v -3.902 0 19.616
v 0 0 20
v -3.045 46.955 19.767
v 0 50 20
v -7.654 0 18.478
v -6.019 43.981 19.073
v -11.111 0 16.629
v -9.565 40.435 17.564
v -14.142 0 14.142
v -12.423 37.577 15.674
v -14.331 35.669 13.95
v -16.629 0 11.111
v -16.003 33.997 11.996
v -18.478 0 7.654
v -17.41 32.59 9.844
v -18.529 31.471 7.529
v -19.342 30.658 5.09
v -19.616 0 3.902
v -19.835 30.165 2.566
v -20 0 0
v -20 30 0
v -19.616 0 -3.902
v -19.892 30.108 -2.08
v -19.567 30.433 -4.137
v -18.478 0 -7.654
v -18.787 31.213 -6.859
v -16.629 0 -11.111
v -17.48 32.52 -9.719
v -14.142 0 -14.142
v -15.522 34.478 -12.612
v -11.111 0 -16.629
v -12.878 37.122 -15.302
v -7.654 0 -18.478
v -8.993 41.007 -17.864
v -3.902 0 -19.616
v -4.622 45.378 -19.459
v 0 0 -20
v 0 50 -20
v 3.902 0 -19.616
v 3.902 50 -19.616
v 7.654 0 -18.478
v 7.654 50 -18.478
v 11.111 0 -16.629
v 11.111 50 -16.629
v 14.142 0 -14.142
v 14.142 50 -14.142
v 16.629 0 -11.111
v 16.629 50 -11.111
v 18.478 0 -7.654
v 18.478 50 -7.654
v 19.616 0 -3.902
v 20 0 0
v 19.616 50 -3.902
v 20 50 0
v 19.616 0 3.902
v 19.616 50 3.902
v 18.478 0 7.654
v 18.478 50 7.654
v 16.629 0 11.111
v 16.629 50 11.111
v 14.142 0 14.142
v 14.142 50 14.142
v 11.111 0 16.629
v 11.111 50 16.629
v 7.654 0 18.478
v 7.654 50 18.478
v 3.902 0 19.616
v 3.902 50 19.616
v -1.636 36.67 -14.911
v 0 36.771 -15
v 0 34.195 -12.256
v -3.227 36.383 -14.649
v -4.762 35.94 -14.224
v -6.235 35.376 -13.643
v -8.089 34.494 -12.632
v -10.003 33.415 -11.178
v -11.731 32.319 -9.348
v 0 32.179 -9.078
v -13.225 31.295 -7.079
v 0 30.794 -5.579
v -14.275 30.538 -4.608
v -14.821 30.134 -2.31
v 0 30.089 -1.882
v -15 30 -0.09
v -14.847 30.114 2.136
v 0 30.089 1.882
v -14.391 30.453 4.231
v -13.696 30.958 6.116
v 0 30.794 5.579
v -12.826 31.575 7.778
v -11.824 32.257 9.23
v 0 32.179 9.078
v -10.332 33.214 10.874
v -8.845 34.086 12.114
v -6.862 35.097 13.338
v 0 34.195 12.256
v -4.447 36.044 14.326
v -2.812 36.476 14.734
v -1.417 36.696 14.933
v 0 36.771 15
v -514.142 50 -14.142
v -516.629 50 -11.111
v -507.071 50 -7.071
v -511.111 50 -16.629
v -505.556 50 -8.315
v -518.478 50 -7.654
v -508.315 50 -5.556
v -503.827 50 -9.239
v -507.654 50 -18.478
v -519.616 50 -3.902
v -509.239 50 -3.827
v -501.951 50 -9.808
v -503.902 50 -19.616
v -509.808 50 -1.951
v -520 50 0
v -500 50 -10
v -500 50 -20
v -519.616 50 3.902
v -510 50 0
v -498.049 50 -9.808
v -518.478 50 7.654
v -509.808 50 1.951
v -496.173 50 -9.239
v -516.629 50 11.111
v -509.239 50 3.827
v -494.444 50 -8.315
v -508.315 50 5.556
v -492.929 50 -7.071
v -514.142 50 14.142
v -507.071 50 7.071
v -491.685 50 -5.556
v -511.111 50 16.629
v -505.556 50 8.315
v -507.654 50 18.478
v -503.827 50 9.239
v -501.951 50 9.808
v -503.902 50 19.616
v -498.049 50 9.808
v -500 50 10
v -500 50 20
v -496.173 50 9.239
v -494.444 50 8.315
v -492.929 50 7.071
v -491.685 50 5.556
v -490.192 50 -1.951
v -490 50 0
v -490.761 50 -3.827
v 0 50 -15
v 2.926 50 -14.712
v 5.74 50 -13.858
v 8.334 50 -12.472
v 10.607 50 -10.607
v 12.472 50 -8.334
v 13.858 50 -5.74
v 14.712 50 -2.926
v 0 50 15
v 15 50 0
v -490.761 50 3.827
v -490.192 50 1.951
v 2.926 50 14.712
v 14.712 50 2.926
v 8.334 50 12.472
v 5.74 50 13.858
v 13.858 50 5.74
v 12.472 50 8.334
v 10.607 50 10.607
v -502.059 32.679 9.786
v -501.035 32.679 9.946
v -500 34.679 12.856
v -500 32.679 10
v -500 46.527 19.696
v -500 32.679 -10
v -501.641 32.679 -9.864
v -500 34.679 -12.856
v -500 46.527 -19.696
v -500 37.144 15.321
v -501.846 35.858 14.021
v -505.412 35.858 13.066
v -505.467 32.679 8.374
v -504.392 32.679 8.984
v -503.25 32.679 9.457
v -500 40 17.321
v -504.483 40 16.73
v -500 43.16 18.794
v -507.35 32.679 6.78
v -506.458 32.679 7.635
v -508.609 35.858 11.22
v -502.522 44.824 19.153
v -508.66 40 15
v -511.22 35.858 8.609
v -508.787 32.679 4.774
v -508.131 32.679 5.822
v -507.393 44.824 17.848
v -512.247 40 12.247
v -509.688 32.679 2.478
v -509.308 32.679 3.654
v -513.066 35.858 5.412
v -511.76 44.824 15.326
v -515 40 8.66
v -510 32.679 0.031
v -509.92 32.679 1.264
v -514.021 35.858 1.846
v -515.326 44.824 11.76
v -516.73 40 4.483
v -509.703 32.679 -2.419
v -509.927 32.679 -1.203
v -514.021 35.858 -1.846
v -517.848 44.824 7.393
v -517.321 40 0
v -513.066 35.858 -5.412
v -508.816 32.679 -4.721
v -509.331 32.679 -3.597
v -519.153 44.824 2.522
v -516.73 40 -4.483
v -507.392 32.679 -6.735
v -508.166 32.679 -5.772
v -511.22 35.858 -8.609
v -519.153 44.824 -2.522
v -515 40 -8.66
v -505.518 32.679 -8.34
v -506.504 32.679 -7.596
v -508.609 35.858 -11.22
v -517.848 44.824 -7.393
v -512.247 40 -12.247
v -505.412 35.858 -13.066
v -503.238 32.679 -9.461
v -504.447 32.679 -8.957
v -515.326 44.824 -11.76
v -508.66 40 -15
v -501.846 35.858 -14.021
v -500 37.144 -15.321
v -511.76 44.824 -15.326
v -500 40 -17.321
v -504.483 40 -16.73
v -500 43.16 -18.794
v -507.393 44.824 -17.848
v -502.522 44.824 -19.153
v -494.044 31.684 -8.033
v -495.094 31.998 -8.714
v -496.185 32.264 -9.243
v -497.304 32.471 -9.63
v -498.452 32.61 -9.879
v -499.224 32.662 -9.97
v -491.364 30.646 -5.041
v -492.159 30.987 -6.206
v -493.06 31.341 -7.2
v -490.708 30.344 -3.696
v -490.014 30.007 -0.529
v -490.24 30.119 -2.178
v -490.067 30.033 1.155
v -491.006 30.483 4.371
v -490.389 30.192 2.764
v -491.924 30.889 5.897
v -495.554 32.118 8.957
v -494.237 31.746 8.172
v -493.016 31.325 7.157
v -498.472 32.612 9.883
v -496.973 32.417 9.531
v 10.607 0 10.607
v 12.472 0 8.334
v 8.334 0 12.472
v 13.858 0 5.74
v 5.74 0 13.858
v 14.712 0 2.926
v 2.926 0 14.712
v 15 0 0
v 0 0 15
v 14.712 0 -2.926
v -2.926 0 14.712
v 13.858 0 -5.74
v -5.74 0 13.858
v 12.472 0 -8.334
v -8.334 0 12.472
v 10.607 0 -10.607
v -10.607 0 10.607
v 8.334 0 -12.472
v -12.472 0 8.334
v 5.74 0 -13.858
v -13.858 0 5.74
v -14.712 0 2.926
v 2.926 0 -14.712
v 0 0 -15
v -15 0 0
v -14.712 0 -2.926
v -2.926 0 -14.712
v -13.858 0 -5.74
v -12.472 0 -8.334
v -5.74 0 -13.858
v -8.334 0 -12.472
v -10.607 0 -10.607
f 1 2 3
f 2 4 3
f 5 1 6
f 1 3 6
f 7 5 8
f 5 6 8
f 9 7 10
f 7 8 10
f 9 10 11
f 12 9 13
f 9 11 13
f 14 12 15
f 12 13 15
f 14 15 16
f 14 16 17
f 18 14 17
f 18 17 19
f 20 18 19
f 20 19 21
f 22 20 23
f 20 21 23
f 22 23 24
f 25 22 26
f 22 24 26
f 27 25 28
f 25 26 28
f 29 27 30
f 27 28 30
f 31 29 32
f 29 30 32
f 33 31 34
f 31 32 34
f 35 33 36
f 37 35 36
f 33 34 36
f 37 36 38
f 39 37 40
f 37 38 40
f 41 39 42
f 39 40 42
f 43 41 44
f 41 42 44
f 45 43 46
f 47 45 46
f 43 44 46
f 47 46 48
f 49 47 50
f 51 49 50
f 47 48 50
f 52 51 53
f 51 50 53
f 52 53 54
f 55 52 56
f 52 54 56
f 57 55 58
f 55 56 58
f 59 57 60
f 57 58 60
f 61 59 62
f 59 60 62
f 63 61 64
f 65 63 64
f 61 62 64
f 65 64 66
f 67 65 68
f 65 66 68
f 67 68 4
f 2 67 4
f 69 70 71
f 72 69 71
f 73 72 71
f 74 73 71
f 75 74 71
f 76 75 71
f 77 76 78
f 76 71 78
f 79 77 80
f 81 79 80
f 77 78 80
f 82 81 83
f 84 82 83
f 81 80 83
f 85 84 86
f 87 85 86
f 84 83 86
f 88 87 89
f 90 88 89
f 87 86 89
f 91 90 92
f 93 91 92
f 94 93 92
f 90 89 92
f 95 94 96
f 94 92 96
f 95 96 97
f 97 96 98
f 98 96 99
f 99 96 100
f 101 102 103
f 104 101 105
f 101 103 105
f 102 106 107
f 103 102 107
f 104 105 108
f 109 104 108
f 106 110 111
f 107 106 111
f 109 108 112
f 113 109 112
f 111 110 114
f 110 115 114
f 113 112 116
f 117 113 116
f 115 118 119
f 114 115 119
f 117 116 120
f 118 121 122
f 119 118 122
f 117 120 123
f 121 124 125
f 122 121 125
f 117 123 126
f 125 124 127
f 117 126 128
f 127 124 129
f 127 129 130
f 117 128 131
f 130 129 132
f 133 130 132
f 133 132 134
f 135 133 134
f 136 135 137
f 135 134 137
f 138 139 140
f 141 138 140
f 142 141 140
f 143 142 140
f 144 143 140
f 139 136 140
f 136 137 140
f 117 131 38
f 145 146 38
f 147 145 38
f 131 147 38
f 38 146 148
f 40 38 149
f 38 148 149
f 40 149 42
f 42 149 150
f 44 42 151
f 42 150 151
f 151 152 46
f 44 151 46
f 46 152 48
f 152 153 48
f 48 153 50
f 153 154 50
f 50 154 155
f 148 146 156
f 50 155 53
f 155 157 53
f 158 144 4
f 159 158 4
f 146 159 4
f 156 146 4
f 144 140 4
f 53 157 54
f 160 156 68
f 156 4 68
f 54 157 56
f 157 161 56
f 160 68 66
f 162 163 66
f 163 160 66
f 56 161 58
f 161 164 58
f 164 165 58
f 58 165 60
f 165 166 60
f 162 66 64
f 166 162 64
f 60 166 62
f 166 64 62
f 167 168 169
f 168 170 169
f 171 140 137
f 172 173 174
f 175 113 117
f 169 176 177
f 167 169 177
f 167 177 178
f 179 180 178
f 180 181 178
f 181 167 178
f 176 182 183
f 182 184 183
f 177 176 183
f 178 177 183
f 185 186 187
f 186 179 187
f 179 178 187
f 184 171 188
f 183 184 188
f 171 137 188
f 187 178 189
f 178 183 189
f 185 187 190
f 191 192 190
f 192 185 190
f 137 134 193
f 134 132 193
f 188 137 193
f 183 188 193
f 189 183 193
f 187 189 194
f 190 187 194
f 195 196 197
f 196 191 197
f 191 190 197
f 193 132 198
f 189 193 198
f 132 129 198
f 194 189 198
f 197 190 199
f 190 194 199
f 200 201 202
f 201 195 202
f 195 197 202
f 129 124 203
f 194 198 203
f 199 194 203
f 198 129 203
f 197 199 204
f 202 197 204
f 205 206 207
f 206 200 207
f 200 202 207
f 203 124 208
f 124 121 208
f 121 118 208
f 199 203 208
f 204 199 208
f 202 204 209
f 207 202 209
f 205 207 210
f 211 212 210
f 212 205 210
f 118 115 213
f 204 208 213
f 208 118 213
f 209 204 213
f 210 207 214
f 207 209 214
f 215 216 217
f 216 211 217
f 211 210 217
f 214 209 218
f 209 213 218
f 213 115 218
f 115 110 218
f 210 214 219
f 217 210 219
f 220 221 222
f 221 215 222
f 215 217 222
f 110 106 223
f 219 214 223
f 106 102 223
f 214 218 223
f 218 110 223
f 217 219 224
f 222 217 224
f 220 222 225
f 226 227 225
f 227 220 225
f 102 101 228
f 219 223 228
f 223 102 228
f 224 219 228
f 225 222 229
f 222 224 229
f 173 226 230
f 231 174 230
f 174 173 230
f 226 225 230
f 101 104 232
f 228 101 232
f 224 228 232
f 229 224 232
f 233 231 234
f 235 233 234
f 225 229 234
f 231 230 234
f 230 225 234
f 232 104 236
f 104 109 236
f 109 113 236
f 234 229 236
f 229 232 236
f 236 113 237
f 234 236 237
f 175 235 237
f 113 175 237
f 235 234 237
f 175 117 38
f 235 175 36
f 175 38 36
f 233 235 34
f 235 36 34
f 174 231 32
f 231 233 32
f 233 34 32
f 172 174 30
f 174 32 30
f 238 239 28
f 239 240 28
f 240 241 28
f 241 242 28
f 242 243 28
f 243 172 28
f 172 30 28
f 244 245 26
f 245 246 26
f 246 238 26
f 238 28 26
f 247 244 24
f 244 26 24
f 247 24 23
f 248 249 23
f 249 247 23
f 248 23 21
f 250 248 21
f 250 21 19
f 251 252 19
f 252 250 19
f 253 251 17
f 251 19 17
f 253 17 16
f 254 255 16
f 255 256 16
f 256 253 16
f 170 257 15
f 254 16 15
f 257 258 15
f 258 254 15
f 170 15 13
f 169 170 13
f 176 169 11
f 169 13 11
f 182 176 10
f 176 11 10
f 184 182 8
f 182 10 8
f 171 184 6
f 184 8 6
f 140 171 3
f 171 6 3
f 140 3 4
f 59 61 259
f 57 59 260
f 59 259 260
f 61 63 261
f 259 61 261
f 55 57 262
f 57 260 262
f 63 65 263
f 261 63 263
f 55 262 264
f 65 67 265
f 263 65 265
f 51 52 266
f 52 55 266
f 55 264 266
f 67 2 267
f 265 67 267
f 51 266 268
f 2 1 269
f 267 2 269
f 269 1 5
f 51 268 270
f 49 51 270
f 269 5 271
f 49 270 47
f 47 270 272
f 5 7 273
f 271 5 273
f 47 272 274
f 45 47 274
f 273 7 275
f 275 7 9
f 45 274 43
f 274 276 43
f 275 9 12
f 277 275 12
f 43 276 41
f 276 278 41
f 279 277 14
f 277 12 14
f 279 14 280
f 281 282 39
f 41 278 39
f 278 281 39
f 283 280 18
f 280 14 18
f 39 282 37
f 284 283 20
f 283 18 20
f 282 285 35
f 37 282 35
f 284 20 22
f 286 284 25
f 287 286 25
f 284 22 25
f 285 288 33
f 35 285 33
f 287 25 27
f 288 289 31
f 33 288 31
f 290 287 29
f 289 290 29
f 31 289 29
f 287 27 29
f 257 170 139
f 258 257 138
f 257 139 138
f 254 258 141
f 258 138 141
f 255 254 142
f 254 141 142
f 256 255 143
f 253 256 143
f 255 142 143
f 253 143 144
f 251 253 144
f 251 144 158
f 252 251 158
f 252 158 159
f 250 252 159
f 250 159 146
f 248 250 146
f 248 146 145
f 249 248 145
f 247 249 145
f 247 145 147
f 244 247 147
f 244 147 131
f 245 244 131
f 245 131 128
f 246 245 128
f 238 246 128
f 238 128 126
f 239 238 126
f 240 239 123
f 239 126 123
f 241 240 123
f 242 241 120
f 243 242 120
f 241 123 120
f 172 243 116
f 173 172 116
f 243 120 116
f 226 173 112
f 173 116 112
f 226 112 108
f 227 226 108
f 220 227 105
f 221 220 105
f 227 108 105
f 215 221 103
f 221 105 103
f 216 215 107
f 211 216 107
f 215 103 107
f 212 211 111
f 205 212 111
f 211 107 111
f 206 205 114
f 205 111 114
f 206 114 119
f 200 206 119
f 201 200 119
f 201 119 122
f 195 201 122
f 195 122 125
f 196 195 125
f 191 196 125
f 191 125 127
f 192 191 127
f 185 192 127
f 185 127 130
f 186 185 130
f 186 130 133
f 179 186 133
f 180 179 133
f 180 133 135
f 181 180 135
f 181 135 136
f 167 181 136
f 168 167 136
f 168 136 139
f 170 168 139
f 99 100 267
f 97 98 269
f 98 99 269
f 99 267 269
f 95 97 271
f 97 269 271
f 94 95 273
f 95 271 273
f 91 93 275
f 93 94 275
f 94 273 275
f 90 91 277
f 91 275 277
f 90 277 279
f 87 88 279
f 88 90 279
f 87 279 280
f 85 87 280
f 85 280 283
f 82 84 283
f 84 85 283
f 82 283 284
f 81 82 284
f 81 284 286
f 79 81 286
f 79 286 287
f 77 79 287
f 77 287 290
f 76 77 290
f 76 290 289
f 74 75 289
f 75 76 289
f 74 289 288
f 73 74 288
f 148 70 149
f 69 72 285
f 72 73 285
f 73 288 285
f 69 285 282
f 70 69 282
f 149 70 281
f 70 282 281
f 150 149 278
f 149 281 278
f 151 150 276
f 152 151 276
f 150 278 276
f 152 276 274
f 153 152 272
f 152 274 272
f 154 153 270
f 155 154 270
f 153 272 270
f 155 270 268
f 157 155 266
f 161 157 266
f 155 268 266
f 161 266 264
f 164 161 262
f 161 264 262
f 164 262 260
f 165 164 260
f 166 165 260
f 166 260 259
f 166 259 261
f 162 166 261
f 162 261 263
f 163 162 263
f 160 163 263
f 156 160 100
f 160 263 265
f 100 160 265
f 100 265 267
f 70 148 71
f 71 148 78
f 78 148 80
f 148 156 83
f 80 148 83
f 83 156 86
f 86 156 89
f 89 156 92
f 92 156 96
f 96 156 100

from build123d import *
from build123d.topology import SkipClean

# Parameters (mm, degrees)
REVOLVE_2_ANGLE           = 90
REVOLVE_2_OTHER_WAY_ANGLE = 90
SKETCH_2_R                = 10
CUT_EXTRUDE_1_DEPTH       = 31


with BuildPart() as part:
    # 草图1 → 旋转1 (revolve)
    with BuildSketch(Plane.XY):
        Polygon((15, 30), (15, 0), (20, 0), (20, 50), (15, 50), align=None)
    revolve(axis=Axis((0, 50, 0), (0, -1, 0)))

    # 草图1<3> → 旋转2 (revolve)
    with BuildSketch(Plane.XY):
        with BuildLine():
            Line((0, 30), (0, 50))
            Line((0, 50), (-480, 50))
            ThreePointArc((-480, 50), (-485.857864376, 35.857864376), (-500, 30))
            Line((-500, 30), (0, 30))
        make_face()
    revolve(axis=Axis((0, 50, 0), (-1, 0, 0)), revolution_arc=REVOLVE_2_ANGLE)

    # 草图1<3> → 旋转2 other way (revolve)
    with SkipClean():  # the faces are left unmerged after this step: merging them gives an invalid solid
        with BuildSketch(Plane.XY):
            with BuildLine():
                Line((0, 30), (0, 50))
                Line((0, 50), (-480, 50))
                ThreePointArc((-480, 50), (-485.857864376, 35.857864376), (-500, 30))
                Line((-500, 30), (0, 30))
            make_face()
        revolve(axis=Axis((0, 50, 0), (1, 0, 0)), revolution_arc=REVOLVE_2_OTHER_WAY_ANGLE)

    # 草图1<5> → 旋转4 (revolve)
    with BuildSketch(Plane.XY):
        with BuildLine():
            Line((-500, 50), (-500, 30))
            ThreePointArc((-500, 30), (-485.857864376, 35.857864376), (-480, 50))
            Line((-480, 50), (-500, 50))
        make_face()
    revolve(axis=Axis((-500, 50, 0), (0, -1, 0)))

    # 草图2 → 切除-拉伸1 (cut)
    with BuildSketch(Plane(origin=(0, 50, 0), x_dir=(1, 0, 0), z_dir=(0, 1, 0))):
        with Locations((-500, 0)):
            Circle(SKETCH_2_R)
    extrude(amount=-CUT_EXTRUDE_1_DEPTH, mode=Mode.SUBTRACT)


solid = part.part
